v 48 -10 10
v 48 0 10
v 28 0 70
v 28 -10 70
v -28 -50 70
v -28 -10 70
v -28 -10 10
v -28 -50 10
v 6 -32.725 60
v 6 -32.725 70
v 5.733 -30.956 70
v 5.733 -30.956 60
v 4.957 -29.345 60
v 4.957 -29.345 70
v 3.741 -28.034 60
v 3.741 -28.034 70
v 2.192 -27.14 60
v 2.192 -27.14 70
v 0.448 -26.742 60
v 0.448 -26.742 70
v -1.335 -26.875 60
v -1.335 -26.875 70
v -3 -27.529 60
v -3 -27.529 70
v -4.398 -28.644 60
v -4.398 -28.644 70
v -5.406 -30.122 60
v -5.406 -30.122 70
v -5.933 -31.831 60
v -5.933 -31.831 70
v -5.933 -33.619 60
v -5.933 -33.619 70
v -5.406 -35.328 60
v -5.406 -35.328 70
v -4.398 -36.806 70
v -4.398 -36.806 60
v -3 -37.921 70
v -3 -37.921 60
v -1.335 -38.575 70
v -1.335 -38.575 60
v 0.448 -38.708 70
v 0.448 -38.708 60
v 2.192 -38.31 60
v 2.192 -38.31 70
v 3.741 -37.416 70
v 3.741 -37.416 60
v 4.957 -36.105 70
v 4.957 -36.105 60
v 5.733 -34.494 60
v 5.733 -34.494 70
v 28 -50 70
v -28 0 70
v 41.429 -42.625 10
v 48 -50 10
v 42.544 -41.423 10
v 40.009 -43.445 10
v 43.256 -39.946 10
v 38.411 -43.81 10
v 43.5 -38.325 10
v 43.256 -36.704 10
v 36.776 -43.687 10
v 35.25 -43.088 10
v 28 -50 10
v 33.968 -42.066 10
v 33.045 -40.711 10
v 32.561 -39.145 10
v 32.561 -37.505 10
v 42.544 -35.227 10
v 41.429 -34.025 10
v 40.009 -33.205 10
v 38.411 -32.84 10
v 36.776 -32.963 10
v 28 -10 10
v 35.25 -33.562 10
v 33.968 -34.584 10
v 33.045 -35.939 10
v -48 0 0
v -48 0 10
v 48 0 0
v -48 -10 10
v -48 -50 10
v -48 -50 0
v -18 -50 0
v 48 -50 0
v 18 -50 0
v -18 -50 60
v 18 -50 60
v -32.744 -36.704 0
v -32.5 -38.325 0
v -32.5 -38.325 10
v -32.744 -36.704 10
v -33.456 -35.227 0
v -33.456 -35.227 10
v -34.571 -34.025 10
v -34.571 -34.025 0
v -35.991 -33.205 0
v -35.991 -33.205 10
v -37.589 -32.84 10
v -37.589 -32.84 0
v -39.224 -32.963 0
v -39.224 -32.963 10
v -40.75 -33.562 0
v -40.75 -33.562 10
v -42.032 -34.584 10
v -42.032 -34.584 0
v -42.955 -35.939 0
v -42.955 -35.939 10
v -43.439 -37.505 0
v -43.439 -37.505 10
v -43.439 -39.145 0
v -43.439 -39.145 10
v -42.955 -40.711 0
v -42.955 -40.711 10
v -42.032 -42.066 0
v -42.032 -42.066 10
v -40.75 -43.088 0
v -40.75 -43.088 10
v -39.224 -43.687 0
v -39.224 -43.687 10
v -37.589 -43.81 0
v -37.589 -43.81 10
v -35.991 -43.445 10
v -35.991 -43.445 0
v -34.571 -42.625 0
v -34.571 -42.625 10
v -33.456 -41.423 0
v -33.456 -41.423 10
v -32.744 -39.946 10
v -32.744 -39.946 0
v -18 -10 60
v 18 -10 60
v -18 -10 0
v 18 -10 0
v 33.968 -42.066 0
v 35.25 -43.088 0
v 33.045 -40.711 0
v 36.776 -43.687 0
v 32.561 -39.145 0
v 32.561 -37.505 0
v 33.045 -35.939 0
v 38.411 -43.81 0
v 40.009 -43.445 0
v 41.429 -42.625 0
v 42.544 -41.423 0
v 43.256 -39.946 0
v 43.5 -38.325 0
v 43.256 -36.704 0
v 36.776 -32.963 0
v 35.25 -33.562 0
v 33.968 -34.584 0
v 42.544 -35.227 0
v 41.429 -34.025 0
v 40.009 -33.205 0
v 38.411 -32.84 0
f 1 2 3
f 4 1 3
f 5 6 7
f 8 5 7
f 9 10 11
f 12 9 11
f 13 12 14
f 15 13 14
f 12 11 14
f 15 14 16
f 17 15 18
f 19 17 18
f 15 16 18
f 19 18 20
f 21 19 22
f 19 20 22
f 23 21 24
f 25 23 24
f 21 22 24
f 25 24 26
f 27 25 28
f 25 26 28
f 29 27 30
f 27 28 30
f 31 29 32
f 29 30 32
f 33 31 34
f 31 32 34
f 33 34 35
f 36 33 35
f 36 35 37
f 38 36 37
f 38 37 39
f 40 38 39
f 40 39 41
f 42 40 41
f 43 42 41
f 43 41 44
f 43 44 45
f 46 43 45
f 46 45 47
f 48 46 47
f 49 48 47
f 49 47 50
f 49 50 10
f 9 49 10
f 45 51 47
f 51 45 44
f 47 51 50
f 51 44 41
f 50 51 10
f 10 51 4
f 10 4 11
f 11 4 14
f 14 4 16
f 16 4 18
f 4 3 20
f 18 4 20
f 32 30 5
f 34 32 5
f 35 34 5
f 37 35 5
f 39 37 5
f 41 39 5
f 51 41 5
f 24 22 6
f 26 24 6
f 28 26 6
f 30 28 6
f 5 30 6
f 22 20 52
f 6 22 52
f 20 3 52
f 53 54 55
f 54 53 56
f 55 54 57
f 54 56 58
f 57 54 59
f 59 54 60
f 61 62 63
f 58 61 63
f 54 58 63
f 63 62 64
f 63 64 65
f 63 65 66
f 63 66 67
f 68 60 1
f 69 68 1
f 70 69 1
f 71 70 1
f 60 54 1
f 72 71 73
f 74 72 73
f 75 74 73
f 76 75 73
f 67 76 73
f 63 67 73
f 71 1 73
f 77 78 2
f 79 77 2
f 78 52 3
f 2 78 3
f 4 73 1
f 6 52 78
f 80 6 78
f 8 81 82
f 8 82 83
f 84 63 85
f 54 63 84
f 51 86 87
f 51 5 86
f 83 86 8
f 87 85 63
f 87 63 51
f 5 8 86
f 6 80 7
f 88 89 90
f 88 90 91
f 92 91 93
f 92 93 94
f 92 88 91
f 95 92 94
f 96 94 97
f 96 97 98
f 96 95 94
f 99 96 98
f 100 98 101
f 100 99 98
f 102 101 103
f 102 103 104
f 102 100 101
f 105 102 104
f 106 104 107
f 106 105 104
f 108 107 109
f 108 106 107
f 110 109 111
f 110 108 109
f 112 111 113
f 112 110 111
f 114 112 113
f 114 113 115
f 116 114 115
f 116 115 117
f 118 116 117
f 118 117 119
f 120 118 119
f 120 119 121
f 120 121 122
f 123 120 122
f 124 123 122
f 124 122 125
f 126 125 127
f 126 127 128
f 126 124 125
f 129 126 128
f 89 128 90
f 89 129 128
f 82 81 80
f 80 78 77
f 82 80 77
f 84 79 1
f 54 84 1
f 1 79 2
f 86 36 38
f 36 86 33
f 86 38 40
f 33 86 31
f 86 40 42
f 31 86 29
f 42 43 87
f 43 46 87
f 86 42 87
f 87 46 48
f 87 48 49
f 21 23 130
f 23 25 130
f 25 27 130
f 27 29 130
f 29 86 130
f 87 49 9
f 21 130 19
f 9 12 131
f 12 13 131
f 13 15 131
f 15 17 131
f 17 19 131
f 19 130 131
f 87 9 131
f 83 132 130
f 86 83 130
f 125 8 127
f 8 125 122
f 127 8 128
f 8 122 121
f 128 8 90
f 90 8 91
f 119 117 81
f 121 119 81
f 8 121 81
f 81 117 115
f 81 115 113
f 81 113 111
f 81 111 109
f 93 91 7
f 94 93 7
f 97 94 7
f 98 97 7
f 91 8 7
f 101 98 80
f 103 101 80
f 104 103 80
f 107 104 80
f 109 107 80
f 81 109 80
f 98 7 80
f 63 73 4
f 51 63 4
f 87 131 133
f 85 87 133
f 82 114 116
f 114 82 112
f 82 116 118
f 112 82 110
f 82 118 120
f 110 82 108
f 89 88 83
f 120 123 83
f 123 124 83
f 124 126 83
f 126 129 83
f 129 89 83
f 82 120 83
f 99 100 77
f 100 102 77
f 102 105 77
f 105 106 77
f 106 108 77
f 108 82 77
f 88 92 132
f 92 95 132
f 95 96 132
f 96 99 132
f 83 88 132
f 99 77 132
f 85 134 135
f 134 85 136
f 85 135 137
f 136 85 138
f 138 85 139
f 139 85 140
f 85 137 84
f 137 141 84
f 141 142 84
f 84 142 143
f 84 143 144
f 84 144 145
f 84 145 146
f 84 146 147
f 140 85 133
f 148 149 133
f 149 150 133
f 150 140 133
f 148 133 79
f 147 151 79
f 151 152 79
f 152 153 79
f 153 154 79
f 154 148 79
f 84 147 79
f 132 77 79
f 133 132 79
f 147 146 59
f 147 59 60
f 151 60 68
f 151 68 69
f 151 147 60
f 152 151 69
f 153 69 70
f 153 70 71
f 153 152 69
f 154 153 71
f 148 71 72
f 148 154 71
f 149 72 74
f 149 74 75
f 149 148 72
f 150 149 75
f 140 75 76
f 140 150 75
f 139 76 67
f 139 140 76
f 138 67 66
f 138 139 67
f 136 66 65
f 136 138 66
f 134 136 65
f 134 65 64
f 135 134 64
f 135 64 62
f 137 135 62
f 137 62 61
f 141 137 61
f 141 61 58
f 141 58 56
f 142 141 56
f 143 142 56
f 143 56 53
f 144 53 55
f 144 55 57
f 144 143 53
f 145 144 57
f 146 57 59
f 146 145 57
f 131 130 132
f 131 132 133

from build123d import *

# Parameters (mm, degrees)
F1_DEPTH = 50
F2_DEPTH = 10
F3_R     = 5.5
F4_DEPTH = 10
F5_R     = 6
F6_DEPTH = 12


with BuildPart() as f1:
    # F0 (on Front) → F1 (new body)
    with BuildSketch(Plane.XZ):
        Polygon((-48, 10), (-48, 0), (-18, 0), (-18, 60), (0, 60), (18, 60), (18, 0), (48, 0), (48, 10), (28, 10), (28, 70), (0, 70), (-28, 70), (-28, 10), align=None)
    extrude(amount=F1_DEPTH)

    # F0 (on Front) → F2 (join)
    with BuildSketch(Plane.XZ):
        Polygon((-28, 70), (-48, 10), (-28, 10), align=None)
        Polygon((48, 10), (28, 70), (28, 10), align=None)
        Polygon((-18, 60), (-18, 0), (0, 0), (18, 0), (18, 60), (0, 60), align=None)
    extrude(amount=F2_DEPTH)

    # F3 (on Top) → F4 (cut)
    with BuildSketch(Plane.XY):
        with Locations((-38, -38.325)):
            Circle(F3_R)
        with Locations((38, -38.325)):
            Circle(F3_R)
    extrude(amount=F4_DEPTH, mode=Mode.SUBTRACT)

    # F5 (on face) → F6 (cut)
    with BuildSketch(Plane.XY.offset(70)):
        with Locations((0, -32.725)):
            Circle(F5_R)
    extrude(amount=-F6_DEPTH, mode=Mode.SUBTRACT)


solid = f1.part
